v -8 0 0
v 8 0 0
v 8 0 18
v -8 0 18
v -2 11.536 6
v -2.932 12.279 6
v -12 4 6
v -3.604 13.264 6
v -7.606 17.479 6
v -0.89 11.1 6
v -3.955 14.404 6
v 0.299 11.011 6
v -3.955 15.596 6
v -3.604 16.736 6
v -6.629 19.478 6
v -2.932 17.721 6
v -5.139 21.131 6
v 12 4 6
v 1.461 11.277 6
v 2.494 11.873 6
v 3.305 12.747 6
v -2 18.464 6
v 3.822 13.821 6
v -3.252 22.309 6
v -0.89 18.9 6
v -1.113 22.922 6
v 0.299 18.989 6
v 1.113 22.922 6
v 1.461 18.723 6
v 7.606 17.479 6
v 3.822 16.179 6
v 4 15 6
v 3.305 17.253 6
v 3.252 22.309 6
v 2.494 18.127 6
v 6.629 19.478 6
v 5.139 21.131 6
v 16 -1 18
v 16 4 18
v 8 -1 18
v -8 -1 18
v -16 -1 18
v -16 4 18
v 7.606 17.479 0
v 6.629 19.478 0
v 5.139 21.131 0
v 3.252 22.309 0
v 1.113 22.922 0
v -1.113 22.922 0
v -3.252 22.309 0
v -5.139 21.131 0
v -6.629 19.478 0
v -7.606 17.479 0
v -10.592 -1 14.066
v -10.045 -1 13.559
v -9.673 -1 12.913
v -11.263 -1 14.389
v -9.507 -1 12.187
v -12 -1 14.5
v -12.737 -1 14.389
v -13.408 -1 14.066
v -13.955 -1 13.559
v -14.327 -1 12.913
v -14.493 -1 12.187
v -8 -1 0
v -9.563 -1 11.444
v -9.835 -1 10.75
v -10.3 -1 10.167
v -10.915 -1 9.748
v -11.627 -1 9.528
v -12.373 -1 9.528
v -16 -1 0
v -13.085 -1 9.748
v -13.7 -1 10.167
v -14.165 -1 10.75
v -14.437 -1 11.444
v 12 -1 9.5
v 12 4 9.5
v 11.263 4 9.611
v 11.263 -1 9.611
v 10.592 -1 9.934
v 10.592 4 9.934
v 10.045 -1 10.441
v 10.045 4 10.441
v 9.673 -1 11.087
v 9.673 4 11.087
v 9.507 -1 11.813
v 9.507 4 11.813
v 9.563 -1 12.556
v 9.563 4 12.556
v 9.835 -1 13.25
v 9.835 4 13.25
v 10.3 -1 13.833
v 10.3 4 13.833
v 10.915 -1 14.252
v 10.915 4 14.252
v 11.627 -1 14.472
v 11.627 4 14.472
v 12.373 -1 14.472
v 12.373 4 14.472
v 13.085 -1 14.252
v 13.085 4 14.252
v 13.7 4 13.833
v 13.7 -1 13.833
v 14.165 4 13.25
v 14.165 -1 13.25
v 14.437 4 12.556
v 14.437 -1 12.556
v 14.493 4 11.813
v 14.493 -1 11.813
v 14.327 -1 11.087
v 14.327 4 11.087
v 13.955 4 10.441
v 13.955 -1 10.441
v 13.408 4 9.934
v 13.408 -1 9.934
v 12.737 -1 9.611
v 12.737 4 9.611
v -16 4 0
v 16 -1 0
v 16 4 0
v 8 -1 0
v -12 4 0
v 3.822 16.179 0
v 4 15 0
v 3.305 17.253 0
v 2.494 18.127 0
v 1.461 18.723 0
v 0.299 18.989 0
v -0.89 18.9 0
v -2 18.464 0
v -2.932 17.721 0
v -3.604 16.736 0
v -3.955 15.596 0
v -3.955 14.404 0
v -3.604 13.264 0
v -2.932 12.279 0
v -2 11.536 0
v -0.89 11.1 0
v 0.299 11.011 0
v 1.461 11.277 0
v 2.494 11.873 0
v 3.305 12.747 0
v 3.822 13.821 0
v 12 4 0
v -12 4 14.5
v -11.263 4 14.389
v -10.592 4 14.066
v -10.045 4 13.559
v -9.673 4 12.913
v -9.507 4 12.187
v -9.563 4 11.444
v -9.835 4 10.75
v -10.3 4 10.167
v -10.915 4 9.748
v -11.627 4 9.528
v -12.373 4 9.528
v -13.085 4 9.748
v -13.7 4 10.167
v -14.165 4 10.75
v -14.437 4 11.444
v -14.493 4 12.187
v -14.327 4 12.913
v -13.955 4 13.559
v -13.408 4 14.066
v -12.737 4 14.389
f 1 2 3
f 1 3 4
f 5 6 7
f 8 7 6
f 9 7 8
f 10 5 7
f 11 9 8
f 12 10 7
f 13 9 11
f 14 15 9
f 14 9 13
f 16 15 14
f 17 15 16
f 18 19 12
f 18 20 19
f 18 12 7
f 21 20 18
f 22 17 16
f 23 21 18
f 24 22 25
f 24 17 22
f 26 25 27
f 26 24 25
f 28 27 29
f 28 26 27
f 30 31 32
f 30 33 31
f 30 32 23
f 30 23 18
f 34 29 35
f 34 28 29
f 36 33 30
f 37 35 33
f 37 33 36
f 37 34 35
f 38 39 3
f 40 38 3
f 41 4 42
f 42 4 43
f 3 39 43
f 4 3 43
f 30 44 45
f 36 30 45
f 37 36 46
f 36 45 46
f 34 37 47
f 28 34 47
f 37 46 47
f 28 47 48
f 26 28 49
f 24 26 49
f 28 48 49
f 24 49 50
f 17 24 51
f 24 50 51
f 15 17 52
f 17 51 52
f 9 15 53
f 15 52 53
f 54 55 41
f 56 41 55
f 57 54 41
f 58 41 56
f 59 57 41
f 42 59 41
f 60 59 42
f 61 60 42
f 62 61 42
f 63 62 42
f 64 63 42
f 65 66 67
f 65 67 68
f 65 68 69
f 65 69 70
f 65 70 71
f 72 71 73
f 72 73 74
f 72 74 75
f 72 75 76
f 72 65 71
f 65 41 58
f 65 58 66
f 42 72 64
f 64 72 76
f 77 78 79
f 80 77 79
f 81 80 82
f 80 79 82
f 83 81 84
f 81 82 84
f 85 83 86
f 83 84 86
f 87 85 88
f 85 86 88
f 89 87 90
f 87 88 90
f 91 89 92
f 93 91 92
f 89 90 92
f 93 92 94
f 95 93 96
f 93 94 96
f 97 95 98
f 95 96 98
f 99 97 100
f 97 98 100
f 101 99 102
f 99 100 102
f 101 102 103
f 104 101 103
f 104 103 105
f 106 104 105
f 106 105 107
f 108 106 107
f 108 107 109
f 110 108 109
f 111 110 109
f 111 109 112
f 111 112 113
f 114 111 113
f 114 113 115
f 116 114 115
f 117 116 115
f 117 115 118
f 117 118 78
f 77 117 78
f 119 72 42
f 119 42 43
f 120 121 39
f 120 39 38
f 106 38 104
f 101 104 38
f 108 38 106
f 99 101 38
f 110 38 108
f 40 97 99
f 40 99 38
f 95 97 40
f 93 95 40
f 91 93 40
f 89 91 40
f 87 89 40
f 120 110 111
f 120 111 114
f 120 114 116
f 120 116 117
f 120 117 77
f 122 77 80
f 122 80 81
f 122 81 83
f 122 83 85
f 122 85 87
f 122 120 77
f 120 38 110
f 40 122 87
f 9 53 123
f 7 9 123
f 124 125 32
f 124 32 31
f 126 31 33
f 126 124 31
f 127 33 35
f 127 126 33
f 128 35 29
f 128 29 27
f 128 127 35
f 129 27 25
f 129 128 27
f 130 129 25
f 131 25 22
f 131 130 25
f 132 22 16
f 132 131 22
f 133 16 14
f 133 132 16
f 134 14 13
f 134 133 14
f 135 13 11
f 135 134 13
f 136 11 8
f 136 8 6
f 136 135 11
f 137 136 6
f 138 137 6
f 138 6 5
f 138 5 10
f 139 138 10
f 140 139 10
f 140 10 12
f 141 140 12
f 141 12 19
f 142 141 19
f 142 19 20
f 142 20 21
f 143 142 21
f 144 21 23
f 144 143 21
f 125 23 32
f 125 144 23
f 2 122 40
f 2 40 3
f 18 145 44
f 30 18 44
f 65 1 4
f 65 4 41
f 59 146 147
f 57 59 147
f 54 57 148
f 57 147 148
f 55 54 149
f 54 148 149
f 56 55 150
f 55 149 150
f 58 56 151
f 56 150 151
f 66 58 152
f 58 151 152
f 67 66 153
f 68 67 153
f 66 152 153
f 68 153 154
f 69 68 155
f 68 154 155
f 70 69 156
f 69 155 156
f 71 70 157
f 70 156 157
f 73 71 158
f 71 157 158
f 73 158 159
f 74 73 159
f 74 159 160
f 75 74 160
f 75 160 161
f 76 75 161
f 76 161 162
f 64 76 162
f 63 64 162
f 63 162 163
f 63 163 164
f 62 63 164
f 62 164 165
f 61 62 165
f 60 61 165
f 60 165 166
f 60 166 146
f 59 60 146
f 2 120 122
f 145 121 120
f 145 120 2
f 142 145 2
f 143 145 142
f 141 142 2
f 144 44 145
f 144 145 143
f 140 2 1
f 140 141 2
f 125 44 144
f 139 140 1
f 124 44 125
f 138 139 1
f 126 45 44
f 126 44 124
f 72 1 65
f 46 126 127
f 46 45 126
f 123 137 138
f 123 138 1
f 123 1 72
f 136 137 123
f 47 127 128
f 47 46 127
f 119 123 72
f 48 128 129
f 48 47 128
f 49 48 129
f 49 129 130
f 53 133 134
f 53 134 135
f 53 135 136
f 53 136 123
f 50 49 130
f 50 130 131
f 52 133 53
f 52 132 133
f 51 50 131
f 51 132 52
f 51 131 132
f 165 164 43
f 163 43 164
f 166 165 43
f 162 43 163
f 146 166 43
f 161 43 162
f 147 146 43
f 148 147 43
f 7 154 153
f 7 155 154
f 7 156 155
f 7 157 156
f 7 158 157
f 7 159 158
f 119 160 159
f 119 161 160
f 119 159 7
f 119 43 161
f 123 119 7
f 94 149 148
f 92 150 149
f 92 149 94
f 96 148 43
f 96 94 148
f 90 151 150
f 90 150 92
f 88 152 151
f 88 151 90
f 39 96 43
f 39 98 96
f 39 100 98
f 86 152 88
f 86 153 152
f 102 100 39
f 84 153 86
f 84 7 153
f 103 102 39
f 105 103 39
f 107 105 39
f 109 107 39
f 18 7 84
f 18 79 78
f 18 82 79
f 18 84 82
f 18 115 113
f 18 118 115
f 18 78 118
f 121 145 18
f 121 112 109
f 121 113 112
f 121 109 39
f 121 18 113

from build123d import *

# Parameters (mm, degrees)
EXTRUDE_2_DEPTH     = 18
SKETCH_1_4_R        = 4
EXTRUDE_3_DEPTH     = 6
SKETCH_3_R          = 2.5
CUT_EXTRUDE_2_DEPTH = 31.6757233


with BuildPart() as part:
    # 草图1 → 凸台-拉伸2 (new body)
    with BuildSketch(Plane.XY):
        Polygon((8, 0), (-8, 0), (-8, -1), (-16, -1), (-16, 4), (16, 4), (16, -1), (8, -1), align=None)
    extrude(amount=EXTRUDE_2_DEPTH)

    # 草图1<4> → 凸台-拉伸3 (add)
    with BuildSketch(Plane.XY):
        with BuildLine():
            Line((-12, 4), (12, 4))
            Line((12, 4), (7.606095567, 17.479376982))
            ThreePointArc((7.606095567, 17.479376982), (0, 23), (-7.606095567, 17.479376982))
            Line((-7.606095567, 17.479376982), (-12, 4))
        make_face()
        with Locations((0, 15)):
            Circle(SKETCH_1_4_R, mode=Mode.SUBTRACT)
    extrude(amount=EXTRUDE_3_DEPTH)

    # 草图3 → 切除-拉伸2 (cut, through all)
    with BuildSketch(Plane(origin=(0, 4, 0), x_dir=(1, 0, 0), z_dir=(0, 1, 0))):
        with Locations((-12, -12)):
            Circle(SKETCH_3_R)
        with Locations((12, -12)):
            Circle(SKETCH_3_R)
    extrude(amount=-CUT_EXTRUDE_2_DEPTH, mode=Mode.SUBTRACT)


solid = part.part
